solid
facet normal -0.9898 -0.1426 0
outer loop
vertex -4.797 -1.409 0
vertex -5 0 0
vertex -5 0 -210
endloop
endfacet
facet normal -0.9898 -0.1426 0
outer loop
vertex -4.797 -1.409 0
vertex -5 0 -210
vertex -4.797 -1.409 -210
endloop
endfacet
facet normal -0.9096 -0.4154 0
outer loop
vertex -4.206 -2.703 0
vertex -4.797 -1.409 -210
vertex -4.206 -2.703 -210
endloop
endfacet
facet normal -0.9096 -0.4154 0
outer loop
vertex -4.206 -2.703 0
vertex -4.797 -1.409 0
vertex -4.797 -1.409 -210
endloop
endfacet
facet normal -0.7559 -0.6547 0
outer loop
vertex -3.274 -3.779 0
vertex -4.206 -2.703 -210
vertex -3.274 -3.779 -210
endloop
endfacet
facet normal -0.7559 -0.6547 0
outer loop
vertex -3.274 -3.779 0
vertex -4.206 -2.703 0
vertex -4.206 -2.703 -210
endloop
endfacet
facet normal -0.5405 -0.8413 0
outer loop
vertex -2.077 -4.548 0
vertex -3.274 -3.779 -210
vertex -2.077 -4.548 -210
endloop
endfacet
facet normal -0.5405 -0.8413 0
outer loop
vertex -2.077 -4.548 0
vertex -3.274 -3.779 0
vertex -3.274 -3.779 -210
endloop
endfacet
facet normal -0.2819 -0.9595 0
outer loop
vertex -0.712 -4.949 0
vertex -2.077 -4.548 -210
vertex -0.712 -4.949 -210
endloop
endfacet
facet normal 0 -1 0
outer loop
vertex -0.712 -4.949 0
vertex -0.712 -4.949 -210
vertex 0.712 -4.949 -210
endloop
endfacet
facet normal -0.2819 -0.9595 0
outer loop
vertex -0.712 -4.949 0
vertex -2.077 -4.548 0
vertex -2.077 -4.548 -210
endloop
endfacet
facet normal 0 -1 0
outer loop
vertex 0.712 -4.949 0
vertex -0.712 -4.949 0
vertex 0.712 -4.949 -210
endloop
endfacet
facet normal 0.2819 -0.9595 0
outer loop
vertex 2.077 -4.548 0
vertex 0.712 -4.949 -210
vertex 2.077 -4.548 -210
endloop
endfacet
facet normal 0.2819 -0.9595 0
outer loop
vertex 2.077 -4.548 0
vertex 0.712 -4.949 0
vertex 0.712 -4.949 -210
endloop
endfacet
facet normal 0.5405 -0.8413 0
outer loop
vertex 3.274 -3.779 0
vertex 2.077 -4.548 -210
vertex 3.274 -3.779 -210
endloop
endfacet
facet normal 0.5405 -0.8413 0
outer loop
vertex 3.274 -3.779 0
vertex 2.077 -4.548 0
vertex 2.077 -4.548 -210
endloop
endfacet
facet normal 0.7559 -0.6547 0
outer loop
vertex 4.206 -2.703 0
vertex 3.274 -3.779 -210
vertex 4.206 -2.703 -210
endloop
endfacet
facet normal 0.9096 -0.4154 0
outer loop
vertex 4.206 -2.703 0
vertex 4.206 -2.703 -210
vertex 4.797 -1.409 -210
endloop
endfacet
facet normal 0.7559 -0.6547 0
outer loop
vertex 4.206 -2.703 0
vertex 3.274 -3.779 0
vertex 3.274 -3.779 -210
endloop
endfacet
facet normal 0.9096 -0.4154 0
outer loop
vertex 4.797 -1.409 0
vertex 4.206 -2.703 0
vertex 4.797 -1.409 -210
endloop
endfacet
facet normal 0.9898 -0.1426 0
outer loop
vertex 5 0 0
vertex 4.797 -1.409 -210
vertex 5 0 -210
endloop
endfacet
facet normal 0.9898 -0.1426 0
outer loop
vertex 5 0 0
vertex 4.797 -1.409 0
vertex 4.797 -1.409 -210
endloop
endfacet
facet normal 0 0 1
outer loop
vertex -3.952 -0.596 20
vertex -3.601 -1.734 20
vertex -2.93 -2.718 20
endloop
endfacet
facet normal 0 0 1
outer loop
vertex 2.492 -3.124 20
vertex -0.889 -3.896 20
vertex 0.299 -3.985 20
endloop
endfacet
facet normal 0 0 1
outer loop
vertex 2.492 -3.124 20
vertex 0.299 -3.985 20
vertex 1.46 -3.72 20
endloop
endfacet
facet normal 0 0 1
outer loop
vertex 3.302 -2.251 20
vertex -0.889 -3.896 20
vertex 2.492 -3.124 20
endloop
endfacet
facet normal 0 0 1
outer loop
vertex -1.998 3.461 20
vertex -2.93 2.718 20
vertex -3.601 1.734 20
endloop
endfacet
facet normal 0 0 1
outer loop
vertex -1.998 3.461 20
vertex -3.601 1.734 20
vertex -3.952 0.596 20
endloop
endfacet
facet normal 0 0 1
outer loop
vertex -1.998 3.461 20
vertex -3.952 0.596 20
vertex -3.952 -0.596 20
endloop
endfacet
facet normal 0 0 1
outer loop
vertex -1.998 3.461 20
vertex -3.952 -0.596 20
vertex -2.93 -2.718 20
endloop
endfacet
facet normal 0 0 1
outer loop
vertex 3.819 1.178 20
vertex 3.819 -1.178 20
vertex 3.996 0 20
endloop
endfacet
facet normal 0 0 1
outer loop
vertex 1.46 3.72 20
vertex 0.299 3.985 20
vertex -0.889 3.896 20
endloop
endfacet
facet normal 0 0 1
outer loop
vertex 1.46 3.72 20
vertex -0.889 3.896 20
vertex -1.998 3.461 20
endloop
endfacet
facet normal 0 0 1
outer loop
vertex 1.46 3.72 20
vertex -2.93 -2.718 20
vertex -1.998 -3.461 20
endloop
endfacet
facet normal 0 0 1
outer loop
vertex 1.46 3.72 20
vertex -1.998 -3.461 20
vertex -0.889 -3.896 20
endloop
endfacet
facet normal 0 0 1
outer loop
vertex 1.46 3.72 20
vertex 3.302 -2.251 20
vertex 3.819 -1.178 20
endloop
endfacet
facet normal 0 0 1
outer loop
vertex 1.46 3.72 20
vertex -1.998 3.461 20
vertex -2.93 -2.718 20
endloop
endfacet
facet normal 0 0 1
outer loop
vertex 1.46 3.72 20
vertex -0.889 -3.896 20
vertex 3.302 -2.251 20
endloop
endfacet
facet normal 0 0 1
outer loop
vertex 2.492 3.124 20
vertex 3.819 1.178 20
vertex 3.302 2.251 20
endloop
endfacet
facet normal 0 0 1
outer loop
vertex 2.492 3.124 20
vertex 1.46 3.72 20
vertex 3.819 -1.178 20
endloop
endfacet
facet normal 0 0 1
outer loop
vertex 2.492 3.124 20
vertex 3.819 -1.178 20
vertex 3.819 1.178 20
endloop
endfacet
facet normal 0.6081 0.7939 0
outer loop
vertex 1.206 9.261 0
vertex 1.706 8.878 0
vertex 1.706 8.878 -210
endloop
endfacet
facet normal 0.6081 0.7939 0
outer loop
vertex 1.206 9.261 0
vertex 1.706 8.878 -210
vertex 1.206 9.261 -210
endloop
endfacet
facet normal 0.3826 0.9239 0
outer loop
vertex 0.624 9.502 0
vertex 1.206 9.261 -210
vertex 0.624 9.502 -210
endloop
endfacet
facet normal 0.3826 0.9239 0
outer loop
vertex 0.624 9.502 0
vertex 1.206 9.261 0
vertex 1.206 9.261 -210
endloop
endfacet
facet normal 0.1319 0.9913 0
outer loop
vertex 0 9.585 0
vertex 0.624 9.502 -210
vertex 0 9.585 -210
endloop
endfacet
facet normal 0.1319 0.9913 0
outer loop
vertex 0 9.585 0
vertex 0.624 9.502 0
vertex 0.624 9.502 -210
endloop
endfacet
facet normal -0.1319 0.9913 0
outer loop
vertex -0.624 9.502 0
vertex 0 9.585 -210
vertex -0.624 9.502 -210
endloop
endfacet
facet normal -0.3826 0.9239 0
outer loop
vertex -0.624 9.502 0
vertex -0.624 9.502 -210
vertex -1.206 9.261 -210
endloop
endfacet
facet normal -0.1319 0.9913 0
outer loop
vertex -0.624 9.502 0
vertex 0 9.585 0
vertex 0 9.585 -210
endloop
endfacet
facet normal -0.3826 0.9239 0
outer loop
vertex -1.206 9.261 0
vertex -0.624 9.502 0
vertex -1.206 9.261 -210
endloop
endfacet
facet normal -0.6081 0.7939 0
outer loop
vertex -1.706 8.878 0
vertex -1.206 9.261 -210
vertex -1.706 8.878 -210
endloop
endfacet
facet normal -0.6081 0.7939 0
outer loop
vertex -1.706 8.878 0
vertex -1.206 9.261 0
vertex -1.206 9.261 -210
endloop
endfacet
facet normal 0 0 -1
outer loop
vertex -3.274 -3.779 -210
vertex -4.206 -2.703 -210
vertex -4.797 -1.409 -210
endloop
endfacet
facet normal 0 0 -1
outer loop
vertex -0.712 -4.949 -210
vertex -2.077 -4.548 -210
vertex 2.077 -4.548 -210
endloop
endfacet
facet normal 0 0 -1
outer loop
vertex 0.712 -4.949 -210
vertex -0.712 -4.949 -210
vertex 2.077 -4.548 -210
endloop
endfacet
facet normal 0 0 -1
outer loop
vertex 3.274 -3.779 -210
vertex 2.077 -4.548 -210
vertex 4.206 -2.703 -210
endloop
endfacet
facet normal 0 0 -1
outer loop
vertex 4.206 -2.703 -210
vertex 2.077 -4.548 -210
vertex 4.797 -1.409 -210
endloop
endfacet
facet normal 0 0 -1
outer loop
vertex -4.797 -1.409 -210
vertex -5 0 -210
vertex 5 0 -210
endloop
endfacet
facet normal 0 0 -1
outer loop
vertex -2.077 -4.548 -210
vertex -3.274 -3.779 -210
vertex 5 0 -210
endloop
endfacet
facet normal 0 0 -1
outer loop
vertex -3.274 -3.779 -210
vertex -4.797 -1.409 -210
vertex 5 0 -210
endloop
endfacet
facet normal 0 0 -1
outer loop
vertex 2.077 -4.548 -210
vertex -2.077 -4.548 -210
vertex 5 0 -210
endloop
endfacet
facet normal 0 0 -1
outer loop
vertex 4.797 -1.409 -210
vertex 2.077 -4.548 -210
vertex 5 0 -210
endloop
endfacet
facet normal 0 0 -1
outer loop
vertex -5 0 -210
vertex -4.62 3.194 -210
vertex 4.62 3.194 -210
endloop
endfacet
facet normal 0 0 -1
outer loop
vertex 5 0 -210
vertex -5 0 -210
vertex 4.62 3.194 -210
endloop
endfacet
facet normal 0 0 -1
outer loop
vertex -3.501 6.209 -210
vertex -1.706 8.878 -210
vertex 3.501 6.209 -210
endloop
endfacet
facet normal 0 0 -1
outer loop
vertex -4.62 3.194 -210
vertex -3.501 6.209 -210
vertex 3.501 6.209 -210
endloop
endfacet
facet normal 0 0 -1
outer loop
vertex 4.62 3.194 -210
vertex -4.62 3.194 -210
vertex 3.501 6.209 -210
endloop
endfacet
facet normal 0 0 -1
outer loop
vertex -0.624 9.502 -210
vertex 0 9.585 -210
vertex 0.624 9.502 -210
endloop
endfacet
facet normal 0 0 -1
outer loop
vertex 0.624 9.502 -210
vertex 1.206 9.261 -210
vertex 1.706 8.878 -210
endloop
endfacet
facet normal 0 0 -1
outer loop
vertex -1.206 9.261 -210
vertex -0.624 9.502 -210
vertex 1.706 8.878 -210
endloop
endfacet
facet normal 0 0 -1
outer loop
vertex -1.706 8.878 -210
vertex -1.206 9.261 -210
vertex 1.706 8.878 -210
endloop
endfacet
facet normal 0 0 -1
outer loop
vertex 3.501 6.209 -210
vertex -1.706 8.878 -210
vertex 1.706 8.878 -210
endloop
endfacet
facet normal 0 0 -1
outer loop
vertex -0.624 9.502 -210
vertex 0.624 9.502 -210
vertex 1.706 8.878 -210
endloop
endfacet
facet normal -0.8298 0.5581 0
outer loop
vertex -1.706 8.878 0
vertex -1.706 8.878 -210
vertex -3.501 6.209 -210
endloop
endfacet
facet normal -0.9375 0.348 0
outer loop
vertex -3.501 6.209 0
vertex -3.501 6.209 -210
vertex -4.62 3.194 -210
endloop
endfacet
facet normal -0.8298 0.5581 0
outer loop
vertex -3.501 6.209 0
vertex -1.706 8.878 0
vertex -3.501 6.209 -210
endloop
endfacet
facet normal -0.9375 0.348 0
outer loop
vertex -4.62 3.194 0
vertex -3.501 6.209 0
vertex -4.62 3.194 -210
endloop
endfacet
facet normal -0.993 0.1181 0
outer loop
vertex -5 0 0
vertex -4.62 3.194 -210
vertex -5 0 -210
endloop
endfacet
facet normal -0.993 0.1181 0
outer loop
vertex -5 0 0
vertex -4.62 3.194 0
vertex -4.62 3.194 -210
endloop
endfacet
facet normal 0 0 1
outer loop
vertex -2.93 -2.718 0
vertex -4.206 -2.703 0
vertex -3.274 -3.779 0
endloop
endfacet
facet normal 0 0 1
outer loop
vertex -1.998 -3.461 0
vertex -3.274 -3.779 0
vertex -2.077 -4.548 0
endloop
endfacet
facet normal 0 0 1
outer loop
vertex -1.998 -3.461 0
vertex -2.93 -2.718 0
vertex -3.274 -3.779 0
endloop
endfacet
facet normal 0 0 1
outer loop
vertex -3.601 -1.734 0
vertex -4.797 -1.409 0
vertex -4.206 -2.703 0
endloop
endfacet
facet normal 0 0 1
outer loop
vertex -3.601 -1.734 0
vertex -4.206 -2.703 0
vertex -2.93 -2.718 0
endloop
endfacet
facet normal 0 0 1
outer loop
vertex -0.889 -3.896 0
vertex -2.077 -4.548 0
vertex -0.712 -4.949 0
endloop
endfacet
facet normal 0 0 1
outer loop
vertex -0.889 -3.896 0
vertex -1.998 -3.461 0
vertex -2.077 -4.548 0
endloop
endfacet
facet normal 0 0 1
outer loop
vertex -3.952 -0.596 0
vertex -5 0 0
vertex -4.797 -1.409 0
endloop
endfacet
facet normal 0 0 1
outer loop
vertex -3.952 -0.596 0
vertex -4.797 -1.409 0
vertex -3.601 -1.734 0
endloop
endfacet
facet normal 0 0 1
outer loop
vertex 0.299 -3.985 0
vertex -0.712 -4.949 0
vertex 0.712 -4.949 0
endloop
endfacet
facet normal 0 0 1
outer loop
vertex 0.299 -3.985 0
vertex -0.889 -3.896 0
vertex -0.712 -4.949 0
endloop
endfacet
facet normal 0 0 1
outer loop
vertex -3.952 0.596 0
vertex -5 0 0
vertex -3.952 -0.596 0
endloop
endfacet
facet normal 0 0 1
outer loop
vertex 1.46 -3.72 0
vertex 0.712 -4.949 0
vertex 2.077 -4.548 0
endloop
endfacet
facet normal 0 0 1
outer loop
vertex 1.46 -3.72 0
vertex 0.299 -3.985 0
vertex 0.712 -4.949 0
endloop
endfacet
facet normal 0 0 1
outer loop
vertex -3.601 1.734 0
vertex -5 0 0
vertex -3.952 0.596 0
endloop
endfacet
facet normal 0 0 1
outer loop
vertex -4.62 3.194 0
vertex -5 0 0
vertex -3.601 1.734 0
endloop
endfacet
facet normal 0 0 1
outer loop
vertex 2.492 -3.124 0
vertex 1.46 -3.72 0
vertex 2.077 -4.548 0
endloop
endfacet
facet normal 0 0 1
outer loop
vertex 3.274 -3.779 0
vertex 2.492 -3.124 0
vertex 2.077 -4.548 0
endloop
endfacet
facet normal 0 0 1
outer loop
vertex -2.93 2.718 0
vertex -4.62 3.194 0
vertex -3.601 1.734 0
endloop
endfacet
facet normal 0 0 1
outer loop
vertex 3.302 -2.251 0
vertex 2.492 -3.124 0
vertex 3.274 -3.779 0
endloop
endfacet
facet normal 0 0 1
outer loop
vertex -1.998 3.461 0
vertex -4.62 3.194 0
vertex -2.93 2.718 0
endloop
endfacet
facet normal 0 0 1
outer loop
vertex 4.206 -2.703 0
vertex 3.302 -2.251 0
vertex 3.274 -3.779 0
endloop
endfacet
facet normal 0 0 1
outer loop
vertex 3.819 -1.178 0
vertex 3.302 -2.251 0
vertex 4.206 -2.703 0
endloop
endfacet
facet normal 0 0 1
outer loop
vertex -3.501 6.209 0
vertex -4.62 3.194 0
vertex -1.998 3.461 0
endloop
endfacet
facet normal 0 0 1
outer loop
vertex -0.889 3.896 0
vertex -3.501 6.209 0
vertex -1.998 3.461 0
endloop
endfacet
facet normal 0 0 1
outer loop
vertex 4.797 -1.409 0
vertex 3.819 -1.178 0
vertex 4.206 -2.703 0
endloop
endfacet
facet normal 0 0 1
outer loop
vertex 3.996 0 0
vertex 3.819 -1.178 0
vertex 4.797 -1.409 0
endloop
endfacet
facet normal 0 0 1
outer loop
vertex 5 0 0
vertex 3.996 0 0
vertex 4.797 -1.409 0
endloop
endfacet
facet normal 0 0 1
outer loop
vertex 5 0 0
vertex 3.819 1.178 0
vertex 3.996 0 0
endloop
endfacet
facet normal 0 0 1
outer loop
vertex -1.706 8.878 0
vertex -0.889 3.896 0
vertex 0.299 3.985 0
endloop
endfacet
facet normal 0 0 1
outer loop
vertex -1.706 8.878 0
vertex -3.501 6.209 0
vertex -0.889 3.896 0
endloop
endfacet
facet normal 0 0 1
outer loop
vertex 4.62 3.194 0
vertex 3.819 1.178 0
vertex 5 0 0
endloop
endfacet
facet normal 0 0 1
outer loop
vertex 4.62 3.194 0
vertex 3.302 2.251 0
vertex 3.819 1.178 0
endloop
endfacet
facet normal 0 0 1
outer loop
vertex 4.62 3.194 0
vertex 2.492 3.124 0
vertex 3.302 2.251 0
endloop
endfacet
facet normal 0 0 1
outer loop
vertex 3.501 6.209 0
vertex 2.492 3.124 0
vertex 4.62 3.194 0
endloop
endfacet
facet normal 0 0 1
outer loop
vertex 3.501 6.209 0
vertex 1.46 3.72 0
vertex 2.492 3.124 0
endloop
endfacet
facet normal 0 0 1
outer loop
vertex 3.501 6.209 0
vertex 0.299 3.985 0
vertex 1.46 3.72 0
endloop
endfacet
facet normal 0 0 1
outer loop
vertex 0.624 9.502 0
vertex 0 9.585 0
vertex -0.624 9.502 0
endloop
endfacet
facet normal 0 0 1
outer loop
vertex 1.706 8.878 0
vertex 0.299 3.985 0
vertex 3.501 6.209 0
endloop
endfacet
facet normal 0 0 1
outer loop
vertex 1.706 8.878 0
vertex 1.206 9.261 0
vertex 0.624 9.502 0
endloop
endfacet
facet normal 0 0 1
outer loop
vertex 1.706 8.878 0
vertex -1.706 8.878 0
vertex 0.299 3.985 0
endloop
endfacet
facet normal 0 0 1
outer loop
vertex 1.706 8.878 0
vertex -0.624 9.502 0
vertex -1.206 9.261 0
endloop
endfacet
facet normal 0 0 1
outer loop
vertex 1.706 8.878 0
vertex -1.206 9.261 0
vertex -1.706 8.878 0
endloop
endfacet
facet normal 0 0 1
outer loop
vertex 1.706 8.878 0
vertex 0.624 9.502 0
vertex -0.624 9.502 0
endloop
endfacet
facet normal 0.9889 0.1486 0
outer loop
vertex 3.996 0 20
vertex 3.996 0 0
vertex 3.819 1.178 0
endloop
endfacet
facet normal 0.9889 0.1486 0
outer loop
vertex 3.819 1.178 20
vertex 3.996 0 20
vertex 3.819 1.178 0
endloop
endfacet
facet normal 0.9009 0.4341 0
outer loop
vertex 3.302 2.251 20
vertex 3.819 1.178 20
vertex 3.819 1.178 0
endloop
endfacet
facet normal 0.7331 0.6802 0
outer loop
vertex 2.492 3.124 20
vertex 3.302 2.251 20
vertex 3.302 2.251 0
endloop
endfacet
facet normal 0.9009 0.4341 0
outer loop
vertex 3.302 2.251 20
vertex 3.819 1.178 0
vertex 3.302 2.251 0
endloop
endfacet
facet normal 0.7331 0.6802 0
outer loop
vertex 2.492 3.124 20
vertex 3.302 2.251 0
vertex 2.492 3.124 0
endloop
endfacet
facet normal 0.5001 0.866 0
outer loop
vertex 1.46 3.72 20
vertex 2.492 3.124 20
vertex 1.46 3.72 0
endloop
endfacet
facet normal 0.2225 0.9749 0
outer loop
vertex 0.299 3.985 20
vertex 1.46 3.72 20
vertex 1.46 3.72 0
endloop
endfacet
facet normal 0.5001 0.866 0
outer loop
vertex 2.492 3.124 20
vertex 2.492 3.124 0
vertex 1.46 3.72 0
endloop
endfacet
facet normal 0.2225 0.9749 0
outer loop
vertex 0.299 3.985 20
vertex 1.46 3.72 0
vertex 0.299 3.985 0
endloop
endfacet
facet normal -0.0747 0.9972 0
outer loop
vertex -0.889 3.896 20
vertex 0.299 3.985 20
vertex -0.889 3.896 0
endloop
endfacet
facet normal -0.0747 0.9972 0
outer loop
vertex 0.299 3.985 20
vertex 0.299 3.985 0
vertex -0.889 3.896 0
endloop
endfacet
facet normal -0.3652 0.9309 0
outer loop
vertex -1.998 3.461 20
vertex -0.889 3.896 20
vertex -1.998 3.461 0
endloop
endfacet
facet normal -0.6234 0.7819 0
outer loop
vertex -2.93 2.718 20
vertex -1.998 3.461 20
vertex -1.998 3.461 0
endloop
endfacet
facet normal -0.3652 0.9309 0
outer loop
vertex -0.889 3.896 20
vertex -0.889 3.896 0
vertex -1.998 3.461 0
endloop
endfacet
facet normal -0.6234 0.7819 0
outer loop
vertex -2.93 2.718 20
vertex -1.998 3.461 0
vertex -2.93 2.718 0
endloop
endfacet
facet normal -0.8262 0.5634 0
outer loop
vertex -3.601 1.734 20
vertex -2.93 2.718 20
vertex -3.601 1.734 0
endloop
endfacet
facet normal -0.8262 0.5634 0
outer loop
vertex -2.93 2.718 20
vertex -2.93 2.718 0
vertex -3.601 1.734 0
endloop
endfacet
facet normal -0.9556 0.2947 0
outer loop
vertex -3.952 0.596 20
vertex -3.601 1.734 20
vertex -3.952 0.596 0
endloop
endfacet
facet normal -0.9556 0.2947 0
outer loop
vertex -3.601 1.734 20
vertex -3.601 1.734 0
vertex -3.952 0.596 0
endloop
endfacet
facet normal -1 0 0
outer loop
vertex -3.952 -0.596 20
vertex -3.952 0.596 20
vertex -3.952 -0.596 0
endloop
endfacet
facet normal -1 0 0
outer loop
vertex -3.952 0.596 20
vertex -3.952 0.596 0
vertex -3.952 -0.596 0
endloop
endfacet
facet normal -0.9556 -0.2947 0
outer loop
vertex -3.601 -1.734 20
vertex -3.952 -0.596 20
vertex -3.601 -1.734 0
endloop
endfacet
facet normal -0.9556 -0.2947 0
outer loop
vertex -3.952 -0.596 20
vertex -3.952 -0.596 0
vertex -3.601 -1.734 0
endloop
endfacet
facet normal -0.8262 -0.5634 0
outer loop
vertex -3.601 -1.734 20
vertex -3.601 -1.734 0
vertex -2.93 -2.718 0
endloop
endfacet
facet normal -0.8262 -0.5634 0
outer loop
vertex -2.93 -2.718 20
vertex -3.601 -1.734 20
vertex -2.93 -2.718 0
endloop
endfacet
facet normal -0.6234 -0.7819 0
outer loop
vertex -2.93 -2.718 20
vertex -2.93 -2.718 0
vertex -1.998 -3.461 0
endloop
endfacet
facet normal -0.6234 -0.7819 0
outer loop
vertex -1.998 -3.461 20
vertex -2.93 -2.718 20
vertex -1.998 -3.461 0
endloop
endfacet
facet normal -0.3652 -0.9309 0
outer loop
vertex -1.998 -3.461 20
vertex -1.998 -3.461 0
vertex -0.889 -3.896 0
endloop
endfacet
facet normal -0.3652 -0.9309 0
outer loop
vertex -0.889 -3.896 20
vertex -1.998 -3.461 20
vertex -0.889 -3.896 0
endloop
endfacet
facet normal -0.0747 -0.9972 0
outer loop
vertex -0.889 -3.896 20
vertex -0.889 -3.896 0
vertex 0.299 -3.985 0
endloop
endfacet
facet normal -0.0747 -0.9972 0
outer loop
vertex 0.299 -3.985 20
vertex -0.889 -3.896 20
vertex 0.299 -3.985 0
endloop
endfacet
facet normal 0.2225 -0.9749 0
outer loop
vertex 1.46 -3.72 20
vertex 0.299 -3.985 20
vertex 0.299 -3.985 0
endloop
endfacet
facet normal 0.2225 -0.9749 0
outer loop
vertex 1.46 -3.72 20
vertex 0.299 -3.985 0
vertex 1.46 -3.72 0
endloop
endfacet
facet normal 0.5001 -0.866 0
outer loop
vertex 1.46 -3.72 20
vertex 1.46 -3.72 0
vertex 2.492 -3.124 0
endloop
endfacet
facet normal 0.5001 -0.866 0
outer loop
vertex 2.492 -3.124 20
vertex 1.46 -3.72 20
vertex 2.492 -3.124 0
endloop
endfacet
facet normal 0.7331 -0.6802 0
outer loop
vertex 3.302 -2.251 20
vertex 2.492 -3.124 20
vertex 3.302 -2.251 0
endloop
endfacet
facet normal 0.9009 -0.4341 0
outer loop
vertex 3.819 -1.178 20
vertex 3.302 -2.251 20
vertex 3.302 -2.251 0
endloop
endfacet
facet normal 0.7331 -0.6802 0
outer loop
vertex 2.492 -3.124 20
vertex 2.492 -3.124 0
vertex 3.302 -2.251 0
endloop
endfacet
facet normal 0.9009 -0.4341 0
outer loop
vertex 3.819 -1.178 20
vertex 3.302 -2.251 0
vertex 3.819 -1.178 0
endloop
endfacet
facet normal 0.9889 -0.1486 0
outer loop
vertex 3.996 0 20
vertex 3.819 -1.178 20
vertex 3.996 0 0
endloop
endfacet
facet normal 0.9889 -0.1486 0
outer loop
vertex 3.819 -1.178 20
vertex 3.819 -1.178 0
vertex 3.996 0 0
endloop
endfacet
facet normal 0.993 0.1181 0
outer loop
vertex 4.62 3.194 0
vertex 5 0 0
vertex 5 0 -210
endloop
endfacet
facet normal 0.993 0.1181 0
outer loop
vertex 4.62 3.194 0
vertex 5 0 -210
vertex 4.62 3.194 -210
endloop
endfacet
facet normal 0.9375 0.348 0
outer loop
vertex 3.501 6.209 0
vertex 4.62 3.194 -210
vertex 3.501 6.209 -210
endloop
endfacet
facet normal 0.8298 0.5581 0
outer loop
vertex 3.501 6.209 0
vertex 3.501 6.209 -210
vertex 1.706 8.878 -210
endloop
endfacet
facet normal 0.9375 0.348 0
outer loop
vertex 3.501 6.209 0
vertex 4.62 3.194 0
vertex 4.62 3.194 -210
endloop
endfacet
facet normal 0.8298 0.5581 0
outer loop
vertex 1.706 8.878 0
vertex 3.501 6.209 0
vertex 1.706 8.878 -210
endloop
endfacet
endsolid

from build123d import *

# Parameters (mm, degrees)
SKETCH1_R           = 5
BOSS_EXTRUDE1_DEPTH = 210
BOSS_EXTRUDE2_DEPTH = 210
SKETCH3_R           = 3.996327594
BOSS_EXTRUDE3_DEPTH = 20


with BuildPart() as part:
    # Sketch1 → Boss-Extrude1 (new body)
    with BuildSketch(Plane.XY):
        Circle(SKETCH1_R)
    extrude(amount=-BOSS_EXTRUDE1_DEPTH)

    # Sketch2 → Boss-Extrude2 (add)
    with BuildSketch(Plane.XY):
        with BuildLine():
            Line((-5, 0), (5, 0))
            ThreePointArc((5, 0), (4.149899422, 4.734754346), (1.70579093, 8.878050545))
            ThreePointArc((1.70579093, 8.878050545), (0, 9.584612283), (-1.70579093, 8.878050545))
            ThreePointArc((-1.70579093, 8.878050545), (-4.149899422, 4.734754346), (-5, 0))
        make_face()
    extrude(amount=-BOSS_EXTRUDE2_DEPTH)

    # Sketch3 → Boss-Extrude3 (add)
    with BuildSketch(Plane.XY):
        Circle(SKETCH3_R)
    extrude(amount=BOSS_EXTRUDE3_DEPTH)


solid = part.part
